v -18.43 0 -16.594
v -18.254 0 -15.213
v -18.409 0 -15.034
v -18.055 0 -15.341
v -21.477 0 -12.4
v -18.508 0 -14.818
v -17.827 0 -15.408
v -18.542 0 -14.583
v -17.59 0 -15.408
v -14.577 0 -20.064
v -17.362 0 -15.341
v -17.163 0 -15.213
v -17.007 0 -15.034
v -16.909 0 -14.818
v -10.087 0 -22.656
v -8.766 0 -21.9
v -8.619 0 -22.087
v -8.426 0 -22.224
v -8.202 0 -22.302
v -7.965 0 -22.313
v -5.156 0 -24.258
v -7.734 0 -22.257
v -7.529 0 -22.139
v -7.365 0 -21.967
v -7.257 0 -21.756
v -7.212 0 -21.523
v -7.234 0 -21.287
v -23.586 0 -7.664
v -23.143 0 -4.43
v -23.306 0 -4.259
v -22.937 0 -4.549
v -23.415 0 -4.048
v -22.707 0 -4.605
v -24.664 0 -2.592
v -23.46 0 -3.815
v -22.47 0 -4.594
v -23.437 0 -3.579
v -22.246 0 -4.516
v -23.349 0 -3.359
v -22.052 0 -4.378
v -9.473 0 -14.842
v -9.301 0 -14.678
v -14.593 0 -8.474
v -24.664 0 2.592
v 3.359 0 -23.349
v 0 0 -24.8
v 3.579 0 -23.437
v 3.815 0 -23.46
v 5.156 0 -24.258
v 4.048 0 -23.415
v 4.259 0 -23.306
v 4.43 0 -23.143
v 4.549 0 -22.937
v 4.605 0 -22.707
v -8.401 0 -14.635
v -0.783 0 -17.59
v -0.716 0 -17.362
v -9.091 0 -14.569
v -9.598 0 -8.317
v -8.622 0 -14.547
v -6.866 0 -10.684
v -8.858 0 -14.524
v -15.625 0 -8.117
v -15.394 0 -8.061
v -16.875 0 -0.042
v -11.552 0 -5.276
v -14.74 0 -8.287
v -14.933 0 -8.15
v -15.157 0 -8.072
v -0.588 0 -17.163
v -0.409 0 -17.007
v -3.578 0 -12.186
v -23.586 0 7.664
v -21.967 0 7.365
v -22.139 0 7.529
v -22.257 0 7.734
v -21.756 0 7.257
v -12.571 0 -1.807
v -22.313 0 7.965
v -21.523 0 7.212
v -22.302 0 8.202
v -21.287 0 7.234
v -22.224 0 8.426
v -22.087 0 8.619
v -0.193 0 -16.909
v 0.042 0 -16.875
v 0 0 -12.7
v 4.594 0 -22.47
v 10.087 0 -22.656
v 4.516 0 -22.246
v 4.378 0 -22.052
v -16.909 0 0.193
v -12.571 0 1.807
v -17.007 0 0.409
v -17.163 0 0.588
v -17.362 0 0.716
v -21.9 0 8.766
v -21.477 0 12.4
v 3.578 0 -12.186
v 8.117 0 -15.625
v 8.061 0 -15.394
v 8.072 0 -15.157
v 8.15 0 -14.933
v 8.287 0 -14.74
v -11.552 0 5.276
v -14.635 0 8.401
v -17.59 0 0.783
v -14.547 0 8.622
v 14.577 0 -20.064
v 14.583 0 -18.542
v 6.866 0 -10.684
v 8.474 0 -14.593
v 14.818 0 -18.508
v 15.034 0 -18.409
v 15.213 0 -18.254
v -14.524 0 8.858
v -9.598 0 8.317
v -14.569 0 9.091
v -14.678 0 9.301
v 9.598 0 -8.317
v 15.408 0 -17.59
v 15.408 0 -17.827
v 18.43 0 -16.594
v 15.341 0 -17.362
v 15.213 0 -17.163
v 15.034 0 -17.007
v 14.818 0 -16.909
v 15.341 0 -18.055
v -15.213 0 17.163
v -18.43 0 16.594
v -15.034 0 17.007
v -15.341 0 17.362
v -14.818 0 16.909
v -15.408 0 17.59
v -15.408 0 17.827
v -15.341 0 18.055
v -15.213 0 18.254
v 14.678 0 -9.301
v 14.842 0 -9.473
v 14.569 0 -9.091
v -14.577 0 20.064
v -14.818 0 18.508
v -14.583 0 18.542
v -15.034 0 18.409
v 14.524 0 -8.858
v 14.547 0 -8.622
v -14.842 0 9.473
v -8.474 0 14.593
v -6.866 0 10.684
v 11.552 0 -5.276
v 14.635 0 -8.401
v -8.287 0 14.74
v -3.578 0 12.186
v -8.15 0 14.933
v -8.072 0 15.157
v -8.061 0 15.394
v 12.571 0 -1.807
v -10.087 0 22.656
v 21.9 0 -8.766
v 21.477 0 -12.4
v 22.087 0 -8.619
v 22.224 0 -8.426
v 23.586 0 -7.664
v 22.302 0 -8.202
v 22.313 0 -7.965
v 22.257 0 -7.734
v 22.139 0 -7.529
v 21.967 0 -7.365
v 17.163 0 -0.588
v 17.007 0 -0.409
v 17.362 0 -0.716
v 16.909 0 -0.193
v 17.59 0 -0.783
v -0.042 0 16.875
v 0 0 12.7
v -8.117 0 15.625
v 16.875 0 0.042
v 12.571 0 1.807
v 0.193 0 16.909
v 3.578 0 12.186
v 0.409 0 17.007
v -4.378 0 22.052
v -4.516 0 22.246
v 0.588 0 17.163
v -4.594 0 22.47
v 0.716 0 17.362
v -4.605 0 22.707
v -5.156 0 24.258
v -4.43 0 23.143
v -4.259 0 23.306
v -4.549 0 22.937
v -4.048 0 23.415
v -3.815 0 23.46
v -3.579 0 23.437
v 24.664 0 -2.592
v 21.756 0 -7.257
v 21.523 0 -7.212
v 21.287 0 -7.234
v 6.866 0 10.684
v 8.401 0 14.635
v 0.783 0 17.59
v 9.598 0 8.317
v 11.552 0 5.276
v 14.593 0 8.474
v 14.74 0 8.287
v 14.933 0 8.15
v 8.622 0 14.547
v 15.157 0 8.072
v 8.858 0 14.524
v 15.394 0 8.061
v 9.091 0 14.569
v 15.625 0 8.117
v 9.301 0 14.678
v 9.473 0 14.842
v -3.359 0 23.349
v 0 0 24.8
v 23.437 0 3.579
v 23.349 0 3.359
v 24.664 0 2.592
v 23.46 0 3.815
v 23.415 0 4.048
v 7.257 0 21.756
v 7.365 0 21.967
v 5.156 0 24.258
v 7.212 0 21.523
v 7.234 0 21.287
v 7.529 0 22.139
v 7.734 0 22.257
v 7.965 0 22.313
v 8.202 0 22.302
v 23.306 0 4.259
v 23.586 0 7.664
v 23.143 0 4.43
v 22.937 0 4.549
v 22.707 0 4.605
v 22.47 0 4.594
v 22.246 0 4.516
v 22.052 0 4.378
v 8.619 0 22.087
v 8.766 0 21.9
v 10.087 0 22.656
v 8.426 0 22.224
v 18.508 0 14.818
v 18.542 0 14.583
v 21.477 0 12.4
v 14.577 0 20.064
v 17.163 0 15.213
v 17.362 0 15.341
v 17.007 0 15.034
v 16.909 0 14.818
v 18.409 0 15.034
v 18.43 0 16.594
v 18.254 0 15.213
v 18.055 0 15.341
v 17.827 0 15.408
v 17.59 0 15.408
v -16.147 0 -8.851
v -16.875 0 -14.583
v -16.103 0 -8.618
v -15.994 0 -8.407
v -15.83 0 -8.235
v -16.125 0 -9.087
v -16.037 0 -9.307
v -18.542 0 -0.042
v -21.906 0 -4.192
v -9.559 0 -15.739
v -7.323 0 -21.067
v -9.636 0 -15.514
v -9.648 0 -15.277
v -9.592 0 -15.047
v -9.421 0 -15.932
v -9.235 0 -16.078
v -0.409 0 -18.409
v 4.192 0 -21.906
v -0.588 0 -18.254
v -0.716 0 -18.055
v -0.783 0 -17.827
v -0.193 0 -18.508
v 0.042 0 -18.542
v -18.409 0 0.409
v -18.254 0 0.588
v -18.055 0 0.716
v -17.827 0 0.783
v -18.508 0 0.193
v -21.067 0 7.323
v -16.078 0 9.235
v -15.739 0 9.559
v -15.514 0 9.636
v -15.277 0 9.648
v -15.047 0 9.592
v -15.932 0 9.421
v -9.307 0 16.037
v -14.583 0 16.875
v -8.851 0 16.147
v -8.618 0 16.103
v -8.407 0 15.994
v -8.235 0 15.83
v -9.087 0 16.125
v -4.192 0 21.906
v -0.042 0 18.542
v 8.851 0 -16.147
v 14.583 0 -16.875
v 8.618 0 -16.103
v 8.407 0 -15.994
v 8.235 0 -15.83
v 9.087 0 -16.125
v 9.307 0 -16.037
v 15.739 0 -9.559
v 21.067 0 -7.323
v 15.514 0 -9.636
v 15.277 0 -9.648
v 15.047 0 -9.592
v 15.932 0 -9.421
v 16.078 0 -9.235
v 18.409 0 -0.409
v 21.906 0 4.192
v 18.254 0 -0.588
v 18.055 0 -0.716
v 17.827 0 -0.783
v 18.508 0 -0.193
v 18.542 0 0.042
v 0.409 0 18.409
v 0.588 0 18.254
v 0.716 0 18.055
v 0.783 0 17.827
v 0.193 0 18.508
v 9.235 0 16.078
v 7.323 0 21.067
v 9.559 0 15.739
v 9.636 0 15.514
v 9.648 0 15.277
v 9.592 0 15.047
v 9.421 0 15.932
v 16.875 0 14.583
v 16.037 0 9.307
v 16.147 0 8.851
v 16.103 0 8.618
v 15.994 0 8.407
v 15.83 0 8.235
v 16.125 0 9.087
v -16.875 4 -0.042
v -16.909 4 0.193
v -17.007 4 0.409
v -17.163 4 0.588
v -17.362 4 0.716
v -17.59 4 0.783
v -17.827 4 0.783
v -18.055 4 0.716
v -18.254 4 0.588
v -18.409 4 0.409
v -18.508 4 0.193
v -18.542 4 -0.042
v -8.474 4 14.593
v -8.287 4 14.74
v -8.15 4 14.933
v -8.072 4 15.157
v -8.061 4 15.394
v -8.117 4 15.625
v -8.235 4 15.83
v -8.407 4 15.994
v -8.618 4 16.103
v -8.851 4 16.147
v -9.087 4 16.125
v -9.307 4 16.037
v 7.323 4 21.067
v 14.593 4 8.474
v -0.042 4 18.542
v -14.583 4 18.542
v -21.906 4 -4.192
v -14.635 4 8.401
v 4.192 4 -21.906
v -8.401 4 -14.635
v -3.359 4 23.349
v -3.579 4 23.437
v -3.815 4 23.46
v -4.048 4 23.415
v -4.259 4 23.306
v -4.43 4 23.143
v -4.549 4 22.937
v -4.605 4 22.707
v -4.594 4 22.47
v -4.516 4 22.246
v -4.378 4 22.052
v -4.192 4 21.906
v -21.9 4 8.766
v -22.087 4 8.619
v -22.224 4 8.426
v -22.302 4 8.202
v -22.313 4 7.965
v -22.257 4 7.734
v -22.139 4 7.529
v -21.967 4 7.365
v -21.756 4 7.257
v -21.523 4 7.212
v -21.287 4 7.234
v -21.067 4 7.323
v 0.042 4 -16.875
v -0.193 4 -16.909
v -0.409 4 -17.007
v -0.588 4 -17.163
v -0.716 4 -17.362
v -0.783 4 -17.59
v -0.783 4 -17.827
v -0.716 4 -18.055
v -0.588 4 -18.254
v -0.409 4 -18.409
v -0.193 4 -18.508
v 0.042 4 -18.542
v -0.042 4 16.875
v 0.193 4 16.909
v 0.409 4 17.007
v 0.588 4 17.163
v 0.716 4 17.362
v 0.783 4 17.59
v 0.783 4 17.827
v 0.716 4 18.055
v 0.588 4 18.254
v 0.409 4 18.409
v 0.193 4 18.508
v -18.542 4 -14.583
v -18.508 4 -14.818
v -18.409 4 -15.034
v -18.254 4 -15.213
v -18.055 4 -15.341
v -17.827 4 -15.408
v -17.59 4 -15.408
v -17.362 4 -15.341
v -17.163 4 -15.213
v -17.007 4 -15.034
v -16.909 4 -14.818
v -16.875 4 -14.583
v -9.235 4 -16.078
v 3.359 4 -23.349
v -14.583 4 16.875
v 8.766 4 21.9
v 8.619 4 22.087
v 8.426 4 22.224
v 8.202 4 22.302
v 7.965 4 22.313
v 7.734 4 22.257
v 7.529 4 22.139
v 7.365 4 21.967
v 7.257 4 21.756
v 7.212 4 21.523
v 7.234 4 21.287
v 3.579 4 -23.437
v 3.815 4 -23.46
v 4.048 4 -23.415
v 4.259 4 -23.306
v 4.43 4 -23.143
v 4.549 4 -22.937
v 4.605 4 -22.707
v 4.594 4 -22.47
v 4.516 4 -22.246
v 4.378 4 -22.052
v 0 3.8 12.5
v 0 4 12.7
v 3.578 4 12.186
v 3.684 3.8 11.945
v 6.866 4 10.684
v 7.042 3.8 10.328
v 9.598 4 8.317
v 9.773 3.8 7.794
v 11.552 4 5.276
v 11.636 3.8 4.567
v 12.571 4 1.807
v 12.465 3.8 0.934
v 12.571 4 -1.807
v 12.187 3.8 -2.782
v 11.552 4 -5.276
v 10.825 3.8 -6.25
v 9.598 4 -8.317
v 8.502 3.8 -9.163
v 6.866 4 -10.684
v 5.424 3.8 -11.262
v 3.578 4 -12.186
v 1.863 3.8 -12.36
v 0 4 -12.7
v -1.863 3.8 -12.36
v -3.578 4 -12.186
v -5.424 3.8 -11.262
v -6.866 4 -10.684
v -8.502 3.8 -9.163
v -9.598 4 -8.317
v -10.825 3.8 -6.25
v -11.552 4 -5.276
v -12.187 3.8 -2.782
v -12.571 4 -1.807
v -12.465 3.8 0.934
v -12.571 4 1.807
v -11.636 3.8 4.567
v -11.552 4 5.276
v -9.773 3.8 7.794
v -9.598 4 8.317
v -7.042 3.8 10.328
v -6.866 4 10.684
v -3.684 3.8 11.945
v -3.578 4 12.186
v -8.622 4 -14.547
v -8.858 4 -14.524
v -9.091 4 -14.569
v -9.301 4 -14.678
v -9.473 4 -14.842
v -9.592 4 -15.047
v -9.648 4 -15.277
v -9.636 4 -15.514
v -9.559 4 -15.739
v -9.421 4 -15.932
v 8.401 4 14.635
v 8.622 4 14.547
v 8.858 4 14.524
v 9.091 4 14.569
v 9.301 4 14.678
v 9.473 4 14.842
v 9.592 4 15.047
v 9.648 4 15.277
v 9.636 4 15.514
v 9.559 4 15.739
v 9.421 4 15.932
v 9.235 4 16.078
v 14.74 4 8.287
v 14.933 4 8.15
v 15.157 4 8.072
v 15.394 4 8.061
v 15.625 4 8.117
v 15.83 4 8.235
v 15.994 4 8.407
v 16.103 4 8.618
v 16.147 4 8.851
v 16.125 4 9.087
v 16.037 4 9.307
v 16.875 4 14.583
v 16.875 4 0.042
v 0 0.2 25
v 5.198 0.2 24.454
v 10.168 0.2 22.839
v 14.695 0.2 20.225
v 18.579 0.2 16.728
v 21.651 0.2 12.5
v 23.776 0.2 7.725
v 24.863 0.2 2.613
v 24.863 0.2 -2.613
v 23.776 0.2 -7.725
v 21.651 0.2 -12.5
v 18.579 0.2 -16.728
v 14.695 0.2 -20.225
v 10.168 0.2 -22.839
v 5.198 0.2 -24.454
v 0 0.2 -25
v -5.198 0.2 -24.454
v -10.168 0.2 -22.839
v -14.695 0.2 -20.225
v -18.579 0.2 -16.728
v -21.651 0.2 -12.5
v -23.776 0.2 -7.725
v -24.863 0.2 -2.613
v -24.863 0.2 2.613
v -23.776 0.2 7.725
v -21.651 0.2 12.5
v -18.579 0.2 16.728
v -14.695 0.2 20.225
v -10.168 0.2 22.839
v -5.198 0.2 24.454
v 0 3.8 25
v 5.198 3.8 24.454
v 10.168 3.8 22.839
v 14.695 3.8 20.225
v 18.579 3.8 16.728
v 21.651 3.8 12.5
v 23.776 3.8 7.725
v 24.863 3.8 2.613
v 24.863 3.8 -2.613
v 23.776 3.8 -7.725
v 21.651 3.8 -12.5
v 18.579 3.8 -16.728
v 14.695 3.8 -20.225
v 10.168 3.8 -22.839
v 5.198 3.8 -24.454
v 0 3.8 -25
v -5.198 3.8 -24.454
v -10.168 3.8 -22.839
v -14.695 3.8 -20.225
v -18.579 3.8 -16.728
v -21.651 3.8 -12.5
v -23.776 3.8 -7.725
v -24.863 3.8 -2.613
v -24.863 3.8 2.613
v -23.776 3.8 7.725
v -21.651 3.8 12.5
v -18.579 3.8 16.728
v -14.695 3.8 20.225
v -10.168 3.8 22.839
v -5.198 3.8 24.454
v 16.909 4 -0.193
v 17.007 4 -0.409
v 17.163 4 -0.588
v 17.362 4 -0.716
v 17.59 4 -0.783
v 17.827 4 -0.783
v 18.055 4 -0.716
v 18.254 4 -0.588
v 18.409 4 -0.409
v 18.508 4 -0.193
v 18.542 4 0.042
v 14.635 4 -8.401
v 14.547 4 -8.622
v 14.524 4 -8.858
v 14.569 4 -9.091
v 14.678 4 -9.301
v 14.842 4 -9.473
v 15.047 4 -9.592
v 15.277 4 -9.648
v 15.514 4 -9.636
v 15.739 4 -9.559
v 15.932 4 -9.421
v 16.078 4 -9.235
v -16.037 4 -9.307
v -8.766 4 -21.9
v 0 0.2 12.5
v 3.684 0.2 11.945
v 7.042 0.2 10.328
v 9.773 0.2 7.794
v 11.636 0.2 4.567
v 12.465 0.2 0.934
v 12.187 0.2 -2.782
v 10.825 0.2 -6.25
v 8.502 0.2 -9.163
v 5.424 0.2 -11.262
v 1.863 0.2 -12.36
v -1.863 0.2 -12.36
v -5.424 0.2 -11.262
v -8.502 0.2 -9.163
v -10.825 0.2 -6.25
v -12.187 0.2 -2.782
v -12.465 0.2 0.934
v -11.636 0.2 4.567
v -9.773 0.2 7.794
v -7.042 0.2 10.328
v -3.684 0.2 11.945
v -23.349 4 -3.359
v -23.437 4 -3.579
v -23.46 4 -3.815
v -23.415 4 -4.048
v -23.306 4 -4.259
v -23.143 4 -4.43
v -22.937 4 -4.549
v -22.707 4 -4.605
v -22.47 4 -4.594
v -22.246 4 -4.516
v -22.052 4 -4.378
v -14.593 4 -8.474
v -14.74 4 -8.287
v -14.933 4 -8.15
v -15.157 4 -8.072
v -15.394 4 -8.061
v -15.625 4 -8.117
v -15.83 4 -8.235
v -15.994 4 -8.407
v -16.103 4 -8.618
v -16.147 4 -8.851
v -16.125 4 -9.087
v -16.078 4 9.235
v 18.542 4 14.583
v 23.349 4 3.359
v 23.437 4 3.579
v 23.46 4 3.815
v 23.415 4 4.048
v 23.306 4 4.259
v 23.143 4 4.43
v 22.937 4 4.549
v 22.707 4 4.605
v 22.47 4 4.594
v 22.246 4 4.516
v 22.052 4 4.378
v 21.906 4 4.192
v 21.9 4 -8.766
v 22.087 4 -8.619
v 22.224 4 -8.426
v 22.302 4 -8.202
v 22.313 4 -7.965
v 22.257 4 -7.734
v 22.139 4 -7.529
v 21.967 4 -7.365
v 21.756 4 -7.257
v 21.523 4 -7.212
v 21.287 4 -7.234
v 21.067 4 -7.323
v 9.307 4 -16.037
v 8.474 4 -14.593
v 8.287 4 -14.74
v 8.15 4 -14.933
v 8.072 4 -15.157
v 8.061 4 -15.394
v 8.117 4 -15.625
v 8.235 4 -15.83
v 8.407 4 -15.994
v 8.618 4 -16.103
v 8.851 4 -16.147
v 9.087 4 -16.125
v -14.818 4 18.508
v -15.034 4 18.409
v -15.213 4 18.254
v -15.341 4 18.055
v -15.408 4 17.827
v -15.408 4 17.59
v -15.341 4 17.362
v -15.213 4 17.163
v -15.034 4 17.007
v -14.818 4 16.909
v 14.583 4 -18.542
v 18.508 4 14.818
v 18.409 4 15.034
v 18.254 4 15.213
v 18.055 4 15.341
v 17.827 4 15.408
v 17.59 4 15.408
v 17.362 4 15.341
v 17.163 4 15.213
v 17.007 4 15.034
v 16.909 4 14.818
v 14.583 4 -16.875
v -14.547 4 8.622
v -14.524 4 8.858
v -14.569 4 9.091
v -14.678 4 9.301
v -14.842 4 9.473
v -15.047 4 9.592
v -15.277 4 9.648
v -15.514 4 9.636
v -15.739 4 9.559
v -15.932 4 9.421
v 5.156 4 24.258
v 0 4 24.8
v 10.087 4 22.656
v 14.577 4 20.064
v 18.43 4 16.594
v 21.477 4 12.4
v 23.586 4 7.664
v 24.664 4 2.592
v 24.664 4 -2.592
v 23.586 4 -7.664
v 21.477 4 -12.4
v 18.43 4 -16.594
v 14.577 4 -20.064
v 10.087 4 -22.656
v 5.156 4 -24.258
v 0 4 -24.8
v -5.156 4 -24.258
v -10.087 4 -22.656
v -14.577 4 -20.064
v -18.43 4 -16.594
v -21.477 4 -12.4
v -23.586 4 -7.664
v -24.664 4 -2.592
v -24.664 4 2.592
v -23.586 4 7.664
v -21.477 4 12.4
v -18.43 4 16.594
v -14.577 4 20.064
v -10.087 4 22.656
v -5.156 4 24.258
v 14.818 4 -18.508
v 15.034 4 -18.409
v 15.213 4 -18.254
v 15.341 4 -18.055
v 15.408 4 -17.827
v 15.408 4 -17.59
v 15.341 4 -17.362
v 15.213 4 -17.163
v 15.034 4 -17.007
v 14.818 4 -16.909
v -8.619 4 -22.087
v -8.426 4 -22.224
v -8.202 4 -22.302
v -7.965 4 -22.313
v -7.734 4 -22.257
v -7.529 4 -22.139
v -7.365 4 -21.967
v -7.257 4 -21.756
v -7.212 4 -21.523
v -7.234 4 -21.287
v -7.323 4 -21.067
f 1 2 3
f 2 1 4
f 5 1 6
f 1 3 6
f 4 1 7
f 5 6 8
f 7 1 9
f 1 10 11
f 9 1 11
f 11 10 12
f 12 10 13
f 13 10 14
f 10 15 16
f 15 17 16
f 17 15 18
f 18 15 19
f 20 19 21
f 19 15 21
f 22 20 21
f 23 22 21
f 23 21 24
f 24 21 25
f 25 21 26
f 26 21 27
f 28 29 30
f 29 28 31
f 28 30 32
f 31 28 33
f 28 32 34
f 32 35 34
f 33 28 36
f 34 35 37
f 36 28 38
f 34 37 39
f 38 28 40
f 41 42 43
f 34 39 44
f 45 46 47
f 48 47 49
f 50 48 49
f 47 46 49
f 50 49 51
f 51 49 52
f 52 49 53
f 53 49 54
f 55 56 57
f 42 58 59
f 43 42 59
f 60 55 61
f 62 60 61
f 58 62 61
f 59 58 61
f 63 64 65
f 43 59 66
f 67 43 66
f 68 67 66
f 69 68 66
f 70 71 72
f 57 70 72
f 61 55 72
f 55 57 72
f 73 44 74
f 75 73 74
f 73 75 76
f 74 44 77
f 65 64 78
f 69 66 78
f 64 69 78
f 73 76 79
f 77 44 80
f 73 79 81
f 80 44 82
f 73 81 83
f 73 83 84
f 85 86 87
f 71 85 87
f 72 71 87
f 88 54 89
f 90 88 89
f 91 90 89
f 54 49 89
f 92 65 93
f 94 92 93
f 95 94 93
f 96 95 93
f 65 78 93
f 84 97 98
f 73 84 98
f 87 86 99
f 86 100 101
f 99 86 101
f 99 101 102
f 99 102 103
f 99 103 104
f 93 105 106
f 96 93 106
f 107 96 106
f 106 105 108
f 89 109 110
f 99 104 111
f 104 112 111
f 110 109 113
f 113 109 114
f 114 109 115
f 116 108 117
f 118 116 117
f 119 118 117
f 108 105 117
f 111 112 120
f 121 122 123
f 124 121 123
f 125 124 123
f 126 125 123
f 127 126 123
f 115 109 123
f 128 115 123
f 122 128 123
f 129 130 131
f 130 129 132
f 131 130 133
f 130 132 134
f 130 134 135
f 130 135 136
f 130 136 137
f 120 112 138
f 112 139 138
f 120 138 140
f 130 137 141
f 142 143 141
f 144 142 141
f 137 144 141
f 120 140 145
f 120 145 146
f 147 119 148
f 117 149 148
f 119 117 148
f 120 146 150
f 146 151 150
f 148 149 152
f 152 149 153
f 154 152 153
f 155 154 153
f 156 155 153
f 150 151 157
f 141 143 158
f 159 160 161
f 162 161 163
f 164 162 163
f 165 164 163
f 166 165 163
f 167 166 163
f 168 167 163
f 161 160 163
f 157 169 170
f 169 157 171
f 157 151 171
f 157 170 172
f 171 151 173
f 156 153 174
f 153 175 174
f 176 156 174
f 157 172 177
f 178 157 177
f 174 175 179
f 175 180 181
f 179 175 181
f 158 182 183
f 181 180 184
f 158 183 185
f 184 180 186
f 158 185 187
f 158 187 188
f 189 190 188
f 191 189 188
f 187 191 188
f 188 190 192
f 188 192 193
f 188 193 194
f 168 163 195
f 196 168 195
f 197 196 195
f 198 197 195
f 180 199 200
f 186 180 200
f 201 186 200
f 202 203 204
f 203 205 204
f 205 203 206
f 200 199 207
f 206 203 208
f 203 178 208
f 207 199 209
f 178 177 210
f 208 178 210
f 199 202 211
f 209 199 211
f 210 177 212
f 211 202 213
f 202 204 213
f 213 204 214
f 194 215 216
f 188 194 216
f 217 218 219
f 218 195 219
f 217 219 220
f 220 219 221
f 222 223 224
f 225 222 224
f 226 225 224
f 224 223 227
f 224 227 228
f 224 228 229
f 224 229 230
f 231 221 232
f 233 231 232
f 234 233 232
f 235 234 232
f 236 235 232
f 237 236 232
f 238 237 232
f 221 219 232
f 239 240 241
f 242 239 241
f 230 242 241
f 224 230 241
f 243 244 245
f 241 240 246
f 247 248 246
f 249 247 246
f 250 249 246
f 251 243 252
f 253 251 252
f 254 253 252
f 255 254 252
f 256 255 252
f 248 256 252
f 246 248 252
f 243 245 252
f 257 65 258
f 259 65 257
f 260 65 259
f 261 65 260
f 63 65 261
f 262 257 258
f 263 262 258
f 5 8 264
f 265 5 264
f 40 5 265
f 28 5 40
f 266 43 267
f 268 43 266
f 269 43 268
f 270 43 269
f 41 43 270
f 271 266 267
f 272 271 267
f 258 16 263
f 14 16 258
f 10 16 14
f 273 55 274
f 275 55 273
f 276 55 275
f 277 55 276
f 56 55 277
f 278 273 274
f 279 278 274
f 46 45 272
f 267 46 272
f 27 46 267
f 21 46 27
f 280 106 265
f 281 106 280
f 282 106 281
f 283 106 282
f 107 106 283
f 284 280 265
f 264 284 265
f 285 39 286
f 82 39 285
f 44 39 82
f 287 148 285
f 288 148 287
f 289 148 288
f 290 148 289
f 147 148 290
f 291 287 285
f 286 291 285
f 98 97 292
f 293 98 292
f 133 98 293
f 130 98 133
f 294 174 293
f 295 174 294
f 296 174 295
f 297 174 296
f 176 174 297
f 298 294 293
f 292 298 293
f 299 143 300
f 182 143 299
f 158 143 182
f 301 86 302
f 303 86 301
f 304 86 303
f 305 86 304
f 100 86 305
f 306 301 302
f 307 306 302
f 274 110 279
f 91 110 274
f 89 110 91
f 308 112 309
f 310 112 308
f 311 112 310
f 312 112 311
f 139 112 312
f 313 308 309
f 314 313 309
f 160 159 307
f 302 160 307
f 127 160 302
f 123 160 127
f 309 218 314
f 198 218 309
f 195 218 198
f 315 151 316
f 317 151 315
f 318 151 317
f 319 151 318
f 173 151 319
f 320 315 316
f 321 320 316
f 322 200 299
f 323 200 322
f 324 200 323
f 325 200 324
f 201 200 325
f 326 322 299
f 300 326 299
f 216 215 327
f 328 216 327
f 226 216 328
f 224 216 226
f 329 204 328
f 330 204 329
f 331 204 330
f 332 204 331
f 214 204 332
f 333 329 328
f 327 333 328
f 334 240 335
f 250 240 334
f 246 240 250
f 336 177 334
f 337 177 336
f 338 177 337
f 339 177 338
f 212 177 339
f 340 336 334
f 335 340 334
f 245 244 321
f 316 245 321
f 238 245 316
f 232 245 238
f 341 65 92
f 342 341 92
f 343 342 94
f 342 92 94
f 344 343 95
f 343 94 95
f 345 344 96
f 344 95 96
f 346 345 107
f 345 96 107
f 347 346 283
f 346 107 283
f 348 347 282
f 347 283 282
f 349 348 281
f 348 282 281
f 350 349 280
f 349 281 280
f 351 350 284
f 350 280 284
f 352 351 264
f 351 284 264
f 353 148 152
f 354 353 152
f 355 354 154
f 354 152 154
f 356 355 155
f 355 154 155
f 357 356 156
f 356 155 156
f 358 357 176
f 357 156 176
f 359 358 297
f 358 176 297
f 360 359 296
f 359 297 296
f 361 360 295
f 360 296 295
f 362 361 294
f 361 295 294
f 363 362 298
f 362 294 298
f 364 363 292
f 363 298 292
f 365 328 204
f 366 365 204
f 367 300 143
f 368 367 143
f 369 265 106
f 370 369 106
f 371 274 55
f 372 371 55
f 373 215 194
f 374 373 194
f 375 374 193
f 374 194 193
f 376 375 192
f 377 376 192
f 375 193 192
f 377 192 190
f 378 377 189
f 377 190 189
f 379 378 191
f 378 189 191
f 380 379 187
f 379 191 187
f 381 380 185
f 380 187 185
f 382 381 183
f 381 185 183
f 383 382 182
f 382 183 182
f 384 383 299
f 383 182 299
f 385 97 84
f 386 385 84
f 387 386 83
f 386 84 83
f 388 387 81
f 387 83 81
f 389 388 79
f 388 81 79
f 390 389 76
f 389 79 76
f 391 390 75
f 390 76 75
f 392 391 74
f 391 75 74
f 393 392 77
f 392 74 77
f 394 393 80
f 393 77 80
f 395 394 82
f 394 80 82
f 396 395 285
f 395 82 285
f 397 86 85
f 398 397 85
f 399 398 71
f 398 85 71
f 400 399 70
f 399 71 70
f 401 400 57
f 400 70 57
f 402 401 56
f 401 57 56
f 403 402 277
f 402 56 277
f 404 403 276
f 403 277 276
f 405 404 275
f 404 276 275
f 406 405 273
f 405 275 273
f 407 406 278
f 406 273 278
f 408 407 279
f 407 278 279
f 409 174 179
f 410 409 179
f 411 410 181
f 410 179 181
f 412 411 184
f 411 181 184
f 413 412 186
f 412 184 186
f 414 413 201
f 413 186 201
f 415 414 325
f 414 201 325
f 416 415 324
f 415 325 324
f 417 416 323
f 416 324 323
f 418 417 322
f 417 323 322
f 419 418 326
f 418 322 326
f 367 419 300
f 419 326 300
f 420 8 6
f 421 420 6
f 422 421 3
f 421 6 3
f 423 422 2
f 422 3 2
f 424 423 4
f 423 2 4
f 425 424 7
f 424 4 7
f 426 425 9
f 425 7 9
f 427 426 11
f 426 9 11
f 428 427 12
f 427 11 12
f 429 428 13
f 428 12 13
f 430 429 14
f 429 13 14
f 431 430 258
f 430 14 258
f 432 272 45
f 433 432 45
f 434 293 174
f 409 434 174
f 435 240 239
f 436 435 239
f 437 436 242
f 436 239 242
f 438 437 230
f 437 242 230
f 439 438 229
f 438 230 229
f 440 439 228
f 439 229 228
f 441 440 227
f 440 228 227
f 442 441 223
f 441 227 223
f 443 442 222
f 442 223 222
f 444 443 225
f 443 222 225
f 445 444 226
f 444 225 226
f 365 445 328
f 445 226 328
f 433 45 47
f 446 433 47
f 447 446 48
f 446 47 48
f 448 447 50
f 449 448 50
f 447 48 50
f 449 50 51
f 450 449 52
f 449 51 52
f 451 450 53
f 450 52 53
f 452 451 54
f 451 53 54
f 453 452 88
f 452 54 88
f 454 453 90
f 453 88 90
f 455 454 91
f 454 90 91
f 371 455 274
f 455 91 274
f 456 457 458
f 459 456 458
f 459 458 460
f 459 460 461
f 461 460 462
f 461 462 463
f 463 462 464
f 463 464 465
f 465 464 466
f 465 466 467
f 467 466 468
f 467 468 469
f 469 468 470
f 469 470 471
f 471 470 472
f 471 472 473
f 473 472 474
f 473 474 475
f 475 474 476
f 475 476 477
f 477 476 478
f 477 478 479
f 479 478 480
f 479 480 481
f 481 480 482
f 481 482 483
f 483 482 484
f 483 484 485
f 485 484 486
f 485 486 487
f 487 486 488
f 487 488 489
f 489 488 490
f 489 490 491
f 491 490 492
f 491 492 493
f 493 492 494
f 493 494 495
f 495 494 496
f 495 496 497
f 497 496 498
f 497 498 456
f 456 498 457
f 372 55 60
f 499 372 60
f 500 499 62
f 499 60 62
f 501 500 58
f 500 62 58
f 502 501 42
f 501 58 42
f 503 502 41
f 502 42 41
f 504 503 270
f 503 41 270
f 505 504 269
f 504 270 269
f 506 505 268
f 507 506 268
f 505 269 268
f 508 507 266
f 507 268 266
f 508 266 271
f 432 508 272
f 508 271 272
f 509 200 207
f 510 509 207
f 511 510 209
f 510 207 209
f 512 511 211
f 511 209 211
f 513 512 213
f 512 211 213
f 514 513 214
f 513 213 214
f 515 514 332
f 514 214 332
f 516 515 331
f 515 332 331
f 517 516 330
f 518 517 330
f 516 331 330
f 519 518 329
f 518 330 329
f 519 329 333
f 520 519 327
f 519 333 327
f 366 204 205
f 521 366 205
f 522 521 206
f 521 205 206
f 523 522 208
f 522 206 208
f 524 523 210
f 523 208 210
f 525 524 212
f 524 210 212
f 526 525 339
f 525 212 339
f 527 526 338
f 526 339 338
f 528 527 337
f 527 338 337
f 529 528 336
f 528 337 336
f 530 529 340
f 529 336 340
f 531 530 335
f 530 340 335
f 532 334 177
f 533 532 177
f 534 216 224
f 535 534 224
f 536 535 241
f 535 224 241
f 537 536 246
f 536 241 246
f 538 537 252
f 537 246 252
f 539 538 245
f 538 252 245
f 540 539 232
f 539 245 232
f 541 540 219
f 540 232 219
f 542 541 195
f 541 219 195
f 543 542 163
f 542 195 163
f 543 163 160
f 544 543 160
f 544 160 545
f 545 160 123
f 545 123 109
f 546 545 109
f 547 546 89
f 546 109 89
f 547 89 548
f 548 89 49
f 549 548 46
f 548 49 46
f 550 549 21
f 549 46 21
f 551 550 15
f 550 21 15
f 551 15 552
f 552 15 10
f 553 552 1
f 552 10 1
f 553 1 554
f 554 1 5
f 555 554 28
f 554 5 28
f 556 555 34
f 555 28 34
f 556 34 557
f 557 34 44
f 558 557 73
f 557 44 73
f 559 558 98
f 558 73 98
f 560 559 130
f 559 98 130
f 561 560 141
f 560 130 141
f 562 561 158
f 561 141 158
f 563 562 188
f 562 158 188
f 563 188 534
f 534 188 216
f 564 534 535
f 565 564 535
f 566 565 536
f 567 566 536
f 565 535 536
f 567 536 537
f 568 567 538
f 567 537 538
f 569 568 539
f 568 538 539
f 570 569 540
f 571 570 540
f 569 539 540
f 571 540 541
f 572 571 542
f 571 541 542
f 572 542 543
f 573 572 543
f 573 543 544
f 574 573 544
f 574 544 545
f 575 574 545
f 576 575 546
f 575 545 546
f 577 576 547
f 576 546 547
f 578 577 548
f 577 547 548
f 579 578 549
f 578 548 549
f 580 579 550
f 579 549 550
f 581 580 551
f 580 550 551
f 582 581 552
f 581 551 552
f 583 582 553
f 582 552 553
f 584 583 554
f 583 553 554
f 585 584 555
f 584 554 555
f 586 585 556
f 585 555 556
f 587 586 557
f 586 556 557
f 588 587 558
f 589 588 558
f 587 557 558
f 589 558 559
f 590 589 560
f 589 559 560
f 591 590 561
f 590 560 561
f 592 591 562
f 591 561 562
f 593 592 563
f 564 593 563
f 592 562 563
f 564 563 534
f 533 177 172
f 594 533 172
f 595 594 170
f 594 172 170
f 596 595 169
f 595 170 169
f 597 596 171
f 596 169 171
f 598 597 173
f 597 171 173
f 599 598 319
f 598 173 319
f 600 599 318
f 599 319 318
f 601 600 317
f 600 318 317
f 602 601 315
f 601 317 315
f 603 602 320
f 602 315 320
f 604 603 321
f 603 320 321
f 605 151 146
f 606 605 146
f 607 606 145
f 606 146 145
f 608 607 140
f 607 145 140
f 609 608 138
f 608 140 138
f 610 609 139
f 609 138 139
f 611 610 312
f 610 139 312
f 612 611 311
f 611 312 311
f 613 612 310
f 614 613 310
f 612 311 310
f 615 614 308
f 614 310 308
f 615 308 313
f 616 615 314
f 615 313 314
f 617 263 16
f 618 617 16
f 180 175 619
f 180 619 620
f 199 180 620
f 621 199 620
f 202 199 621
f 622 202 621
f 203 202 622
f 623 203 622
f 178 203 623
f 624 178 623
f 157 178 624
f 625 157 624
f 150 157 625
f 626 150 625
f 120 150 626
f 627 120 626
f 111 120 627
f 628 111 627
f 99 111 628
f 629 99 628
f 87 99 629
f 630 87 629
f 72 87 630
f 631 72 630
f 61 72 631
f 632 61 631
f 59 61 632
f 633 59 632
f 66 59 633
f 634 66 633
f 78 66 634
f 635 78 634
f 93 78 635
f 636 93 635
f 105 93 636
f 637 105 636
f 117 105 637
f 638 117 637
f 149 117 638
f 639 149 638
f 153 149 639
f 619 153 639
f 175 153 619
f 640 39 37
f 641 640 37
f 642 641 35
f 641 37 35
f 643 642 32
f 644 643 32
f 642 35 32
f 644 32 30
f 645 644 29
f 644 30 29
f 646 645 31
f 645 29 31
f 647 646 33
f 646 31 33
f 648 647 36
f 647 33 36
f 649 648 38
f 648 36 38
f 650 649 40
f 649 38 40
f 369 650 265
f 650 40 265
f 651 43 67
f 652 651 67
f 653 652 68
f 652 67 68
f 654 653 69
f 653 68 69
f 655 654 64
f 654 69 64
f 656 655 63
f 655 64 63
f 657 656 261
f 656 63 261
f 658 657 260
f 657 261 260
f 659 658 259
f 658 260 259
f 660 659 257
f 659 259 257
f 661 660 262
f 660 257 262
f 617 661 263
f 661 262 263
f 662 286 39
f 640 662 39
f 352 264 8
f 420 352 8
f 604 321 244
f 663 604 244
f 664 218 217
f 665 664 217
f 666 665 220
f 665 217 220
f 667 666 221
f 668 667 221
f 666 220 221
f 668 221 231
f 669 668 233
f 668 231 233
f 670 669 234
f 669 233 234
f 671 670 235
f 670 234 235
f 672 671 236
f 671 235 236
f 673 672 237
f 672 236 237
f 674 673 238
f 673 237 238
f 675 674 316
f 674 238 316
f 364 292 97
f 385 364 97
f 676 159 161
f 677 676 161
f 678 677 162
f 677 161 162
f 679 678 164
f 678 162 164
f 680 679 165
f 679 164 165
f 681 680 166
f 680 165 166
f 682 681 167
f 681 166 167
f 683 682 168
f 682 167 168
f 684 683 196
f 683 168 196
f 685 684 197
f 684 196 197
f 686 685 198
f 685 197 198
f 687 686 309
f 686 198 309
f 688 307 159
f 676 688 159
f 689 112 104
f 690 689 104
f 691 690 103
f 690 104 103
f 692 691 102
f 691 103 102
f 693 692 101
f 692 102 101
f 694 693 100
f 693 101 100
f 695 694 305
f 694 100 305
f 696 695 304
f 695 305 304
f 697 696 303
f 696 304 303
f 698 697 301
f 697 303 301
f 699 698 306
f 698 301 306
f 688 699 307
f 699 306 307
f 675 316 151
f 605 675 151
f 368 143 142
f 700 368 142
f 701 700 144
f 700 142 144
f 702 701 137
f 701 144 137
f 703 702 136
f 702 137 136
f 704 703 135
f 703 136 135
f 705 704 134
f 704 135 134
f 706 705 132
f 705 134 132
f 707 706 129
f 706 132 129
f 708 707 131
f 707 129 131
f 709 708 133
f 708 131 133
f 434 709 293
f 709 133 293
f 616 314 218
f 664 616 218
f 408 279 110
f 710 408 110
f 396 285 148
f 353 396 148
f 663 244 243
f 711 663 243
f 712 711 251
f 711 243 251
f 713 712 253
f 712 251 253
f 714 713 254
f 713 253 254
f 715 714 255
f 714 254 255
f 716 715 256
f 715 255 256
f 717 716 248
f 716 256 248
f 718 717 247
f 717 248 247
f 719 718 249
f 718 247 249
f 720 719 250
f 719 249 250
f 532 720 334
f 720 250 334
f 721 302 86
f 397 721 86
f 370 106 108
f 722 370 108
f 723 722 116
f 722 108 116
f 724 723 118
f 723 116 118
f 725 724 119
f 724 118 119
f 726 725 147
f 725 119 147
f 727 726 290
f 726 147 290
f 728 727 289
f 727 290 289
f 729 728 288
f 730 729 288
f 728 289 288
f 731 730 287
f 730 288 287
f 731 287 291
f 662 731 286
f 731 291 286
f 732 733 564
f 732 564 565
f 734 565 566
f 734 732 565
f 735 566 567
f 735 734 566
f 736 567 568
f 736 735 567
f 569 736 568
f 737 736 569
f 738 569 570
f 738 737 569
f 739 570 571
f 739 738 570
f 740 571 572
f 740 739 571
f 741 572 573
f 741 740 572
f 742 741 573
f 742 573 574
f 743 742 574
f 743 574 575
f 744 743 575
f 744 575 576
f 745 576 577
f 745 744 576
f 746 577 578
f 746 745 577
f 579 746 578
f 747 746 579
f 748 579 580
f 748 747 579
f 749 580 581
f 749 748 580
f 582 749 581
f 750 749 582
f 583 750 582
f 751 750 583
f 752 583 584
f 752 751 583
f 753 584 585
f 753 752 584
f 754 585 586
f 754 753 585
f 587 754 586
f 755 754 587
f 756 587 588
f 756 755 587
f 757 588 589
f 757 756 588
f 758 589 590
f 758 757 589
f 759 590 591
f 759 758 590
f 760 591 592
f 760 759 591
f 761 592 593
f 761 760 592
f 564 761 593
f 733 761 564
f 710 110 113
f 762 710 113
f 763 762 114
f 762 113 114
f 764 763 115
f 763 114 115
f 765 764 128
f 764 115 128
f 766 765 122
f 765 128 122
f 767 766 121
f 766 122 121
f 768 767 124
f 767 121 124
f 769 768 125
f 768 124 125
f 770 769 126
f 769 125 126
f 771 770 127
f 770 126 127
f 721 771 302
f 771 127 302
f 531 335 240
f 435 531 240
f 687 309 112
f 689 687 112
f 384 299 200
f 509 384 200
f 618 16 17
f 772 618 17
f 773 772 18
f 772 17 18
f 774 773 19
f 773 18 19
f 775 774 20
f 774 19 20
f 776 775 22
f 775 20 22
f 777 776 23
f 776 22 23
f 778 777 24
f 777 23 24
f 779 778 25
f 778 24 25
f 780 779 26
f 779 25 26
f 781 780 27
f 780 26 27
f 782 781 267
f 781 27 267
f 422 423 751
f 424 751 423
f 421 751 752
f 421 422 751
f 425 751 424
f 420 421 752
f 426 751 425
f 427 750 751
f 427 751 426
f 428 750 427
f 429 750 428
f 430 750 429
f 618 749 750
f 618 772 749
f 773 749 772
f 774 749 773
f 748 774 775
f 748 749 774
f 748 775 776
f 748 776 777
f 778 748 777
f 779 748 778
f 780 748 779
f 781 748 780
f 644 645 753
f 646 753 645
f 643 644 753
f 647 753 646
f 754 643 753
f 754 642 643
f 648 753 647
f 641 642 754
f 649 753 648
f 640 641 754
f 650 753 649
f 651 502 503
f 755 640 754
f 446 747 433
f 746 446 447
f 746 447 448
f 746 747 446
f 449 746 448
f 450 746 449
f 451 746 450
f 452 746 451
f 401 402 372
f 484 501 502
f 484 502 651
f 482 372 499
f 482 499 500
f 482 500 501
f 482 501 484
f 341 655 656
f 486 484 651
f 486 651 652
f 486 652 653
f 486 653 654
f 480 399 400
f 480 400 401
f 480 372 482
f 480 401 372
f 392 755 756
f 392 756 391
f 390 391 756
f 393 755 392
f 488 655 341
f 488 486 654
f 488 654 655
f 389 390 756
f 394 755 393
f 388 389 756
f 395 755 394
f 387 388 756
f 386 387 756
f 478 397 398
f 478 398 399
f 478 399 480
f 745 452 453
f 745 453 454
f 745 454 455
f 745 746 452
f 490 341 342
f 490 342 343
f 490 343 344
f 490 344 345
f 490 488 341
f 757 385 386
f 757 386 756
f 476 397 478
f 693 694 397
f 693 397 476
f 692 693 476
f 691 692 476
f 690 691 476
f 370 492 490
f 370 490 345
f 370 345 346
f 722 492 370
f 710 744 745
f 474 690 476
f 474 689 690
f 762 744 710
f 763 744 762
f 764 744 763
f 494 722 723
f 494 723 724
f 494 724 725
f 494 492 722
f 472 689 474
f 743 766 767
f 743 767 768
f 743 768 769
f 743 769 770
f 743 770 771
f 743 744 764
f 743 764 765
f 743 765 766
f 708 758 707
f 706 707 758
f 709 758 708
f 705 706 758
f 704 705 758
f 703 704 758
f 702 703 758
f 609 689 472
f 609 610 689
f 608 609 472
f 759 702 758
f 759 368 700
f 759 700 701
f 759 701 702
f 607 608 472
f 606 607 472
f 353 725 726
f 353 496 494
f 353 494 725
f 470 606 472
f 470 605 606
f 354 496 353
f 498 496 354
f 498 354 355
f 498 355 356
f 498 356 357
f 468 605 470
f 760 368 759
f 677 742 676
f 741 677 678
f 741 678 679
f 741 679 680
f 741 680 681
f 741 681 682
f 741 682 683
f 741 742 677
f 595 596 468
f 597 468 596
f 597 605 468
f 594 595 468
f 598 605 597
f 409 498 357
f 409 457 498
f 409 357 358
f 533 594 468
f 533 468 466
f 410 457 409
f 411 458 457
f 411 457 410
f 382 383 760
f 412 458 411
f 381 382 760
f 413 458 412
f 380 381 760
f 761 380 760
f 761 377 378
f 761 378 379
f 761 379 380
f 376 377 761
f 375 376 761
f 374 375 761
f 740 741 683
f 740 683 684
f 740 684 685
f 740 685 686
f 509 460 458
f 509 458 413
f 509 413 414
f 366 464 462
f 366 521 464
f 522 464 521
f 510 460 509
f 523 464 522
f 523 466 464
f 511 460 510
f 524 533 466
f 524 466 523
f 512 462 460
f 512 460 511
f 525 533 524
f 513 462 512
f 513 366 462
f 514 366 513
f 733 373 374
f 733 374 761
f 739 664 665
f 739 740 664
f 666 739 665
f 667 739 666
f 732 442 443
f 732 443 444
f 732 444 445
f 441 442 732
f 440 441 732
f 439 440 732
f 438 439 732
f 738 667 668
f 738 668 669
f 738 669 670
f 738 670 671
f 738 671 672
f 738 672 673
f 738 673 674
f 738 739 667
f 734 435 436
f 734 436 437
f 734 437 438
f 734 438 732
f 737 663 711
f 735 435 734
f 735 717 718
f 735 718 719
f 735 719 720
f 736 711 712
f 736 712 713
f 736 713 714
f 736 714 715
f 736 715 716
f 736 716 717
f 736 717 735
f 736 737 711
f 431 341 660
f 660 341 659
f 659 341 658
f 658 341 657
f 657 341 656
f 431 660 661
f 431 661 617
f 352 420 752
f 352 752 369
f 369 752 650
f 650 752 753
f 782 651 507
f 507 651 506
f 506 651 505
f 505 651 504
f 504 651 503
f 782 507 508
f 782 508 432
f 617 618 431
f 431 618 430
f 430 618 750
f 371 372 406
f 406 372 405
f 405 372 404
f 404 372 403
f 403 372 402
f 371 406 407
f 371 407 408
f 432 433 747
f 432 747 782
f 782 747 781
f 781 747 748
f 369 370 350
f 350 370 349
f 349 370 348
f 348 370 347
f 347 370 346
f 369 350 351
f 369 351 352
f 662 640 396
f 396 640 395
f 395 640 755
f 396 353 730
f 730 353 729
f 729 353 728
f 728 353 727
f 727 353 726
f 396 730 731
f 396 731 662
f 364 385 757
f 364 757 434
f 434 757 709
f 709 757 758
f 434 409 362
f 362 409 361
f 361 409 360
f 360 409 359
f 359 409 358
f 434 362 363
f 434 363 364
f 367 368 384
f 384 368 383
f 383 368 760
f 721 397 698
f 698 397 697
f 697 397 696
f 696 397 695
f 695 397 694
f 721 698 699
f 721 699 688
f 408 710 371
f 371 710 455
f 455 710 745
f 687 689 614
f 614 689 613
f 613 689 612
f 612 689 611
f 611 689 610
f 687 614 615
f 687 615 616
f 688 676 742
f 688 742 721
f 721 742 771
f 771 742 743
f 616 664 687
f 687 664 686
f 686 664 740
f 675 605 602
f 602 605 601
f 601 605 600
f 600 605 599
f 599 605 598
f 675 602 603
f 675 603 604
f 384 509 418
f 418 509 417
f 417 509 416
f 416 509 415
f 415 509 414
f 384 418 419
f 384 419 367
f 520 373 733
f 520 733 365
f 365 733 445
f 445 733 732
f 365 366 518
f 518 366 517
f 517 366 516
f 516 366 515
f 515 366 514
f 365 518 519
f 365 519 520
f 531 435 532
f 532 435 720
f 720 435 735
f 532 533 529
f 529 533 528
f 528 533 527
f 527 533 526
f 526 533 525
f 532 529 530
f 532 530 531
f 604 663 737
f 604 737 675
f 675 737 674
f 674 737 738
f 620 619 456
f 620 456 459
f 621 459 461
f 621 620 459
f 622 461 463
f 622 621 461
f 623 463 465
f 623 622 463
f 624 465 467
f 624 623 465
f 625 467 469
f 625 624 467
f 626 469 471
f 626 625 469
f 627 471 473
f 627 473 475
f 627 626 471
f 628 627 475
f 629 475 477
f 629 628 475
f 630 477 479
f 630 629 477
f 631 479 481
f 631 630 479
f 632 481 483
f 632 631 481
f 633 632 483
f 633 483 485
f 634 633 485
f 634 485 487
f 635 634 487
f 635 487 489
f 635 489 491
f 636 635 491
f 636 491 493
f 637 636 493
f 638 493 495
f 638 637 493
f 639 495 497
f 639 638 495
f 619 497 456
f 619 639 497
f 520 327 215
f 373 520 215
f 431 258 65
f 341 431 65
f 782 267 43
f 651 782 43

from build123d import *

# Parameters (mm, degrees)
SKETCH1_R           = 25
SKETCH1_R_2         = 12.5
BOSS_EXTRUDE1_DEPTH = 4
CHAMFER1_SIZE       = 0.2


with BuildPart() as part:
    # Sketch1 → Boss-Extrude1 (new body)
    with BuildSketch(Plane(origin=(0, 0, 0), x_dir=(1, 0, 0), z_dir=(0, 1, 0))):
        with Locations(Location((0, 0, 0), (0, 0, 270))):
            Circle(SKETCH1_R)
        with Locations(Location((0, 0, 0), (0, 0, 270))):
            Circle(SKETCH1_R_2, mode=Mode.SUBTRACT)
        with BuildLine():
            Line((16.875, -14.583333333), (16.875, -0.041666667))
            ThreePointArc((16.875, -0.041666667), (17.708333333, 0.791666667), (18.541666667, -0.041666667))
            Line((18.541666667, -0.041666667), (18.541666667, -14.583333333))
            ThreePointArc((18.541666667, -14.583333333), (17.708333333, -15.416666667), (16.875, -14.583333333))
        make_face(mode=Mode.SUBTRACT)
        with BuildLine():
            Line((16.078387695, 9.234748942), (23.349221029, -3.358703805))
            ThreePointArc((23.349221029, -3.358703805), (23.044199859, -4.497058308), (21.905845356, -4.192037139))
            Line((21.905845356, -4.192037139), (14.635012022, 8.401415608))
            ThreePointArc((14.635012022, 8.401415608), (14.940033192, 9.539770111), (16.078387695, 9.234748942))
        make_face(mode=Mode.SUBTRACT)
        with BuildLine():
            Line((7.322512022, -21.067037139), (14.593345356, -8.473584392))
            ThreePointArc((14.593345356, -8.473584392), (15.731699859, -8.168563222), (16.036721029, -9.306917725))
            Line((16.036721029, -9.306917725), (8.765887695, -21.900370472))
            ThreePointArc((8.765887695, -21.900370472), (7.627533192, -22.205391642), (7.322512022, -21.067037139))
        make_face(mode=Mode.SUBTRACT)
        with BuildLine():
            Line((-4.192037139, -21.905845356), (8.401415608, -14.635012022))
            ThreePointArc((8.401415608, -14.635012022), (9.539770111, -14.940033192), (9.234748942, -16.078387695))
            Line((9.234748942, -16.078387695), (-3.358703805, -23.349221029))
            ThreePointArc((-3.358703805, -23.349221029), (-4.497058308, -23.044199859), (-4.192037139, -21.905845356))
        make_face(mode=Mode.SUBTRACT)
        with BuildLine():
            Line((-14.583333333, -16.875), (-0.041666667, -16.875))
            ThreePointArc((-0.041666667, -16.875), (0.791666667, -17.708333333), (-0.041666667, -18.541666667))
            Line((-0.041666667, -18.541666667), (-14.583333333, -18.541666667))
            ThreePointArc((-14.583333333, -18.541666667), (-15.416666667, -17.708333333), (-14.583333333, -16.875))
        make_face(mode=Mode.SUBTRACT)
        with BuildLine():
            Line((-21.067037139, -7.322512022), (-8.473584392, -14.593345356))
            ThreePointArc((-8.473584392, -14.593345356), (-8.168563222, -15.731699859), (-9.306917725, -16.036721029))
            Line((-9.306917725, -16.036721029), (-21.900370472, -8.765887695))
            ThreePointArc((-21.900370472, -8.765887695), (-22.205391642, -7.627533192), (-21.067037139, -7.322512022))
        make_face(mode=Mode.SUBTRACT)
        with BuildLine():
            Line((-21.905845356, 4.192037139), (-14.635012022, -8.401415608))
            ThreePointArc((-14.635012022, -8.401415608), (-14.940033192, -9.539770111), (-16.078387695, -9.234748942))
            Line((-16.078387695, -9.234748942), (-23.349221029, 3.358703805))
            ThreePointArc((-23.349221029, 3.358703805), (-23.044199859, 4.497058308), (-21.905845356, 4.192037139))
        make_face(mode=Mode.SUBTRACT)
        with BuildLine():
            Line((-16.875, 14.583333333), (-16.875, 0.041666667))
            ThreePointArc((-16.875, 0.041666667), (-17.708333333, -0.791666667), (-18.541666667, 0.041666667))
            Line((-18.541666667, 0.041666667), (-18.541666667, 14.583333333))
            ThreePointArc((-18.541666667, 14.583333333), (-17.708333333, 15.416666667), (-16.875, 14.583333333))
        make_face(mode=Mode.SUBTRACT)
        with BuildLine():
            Line((-7.322512022, 21.067037139), (-14.593345356, 8.473584392))
            ThreePointArc((-14.593345356, 8.473584392), (-15.731699859, 8.168563222), (-16.036721029, 9.306917725))
            Line((-16.036721029, 9.306917725), (-8.765887695, 21.900370472))
            ThreePointArc((-8.765887695, 21.900370472), (-7.627533192, 22.205391642), (-7.322512022, 21.067037139))
        make_face(mode=Mode.SUBTRACT)
        with BuildLine():
            Line((4.192037139, 21.905845356), (-8.401415608, 14.635012022))
            ThreePointArc((-8.401415608, 14.635012022), (-9.539770111, 14.940033192), (-9.234748942, 16.078387695))
            Line((-9.234748942, 16.078387695), (3.358703805, 23.349221029))
            ThreePointArc((3.358703805, 23.349221029), (4.497058308, 23.044199859), (4.192037139, 21.905845356))
        make_face(mode=Mode.SUBTRACT)
        with BuildLine():
            Line((14.583333333, 16.875), (0.041666667, 16.875))
            ThreePointArc((0.041666667, 16.875), (-0.791666667, 17.708333333), (0.041666667, 18.541666667))
            Line((0.041666667, 18.541666667), (14.583333333, 18.541666667))
            ThreePointArc((14.583333333, 18.541666667), (15.416666667, 17.708333333), (14.583333333, 16.875))
        make_face(mode=Mode.SUBTRACT)
        with BuildLine():
            Line((21.067037139, 7.322512022), (8.473584392, 14.593345356))
            ThreePointArc((8.473584392, 14.593345356), (8.168563222, 15.731699859), (9.306917725, 16.036721029))
            Line((9.306917725, 16.036721029), (21.900370472, 8.765887695))
            ThreePointArc((21.900370472, 8.765887695), (22.205391642, 7.627533192), (21.067037139, 7.322512022))
        make_face(mode=Mode.SUBTRACT)
    extrude(amount=BOSS_EXTRUDE1_DEPTH)

    # Chamfer1
    chamfer1_edges = [part.edges().sort_by_distance(p)[0] for p in [
        (0, 0, -12.5),
        (0, 4, -12.5),
        (0, 0, -25),
        (0, 4, -25),
    ]]
    chamfer(chamfer1_edges, length=CHAMFER1_SIZE)


solid = part.part
